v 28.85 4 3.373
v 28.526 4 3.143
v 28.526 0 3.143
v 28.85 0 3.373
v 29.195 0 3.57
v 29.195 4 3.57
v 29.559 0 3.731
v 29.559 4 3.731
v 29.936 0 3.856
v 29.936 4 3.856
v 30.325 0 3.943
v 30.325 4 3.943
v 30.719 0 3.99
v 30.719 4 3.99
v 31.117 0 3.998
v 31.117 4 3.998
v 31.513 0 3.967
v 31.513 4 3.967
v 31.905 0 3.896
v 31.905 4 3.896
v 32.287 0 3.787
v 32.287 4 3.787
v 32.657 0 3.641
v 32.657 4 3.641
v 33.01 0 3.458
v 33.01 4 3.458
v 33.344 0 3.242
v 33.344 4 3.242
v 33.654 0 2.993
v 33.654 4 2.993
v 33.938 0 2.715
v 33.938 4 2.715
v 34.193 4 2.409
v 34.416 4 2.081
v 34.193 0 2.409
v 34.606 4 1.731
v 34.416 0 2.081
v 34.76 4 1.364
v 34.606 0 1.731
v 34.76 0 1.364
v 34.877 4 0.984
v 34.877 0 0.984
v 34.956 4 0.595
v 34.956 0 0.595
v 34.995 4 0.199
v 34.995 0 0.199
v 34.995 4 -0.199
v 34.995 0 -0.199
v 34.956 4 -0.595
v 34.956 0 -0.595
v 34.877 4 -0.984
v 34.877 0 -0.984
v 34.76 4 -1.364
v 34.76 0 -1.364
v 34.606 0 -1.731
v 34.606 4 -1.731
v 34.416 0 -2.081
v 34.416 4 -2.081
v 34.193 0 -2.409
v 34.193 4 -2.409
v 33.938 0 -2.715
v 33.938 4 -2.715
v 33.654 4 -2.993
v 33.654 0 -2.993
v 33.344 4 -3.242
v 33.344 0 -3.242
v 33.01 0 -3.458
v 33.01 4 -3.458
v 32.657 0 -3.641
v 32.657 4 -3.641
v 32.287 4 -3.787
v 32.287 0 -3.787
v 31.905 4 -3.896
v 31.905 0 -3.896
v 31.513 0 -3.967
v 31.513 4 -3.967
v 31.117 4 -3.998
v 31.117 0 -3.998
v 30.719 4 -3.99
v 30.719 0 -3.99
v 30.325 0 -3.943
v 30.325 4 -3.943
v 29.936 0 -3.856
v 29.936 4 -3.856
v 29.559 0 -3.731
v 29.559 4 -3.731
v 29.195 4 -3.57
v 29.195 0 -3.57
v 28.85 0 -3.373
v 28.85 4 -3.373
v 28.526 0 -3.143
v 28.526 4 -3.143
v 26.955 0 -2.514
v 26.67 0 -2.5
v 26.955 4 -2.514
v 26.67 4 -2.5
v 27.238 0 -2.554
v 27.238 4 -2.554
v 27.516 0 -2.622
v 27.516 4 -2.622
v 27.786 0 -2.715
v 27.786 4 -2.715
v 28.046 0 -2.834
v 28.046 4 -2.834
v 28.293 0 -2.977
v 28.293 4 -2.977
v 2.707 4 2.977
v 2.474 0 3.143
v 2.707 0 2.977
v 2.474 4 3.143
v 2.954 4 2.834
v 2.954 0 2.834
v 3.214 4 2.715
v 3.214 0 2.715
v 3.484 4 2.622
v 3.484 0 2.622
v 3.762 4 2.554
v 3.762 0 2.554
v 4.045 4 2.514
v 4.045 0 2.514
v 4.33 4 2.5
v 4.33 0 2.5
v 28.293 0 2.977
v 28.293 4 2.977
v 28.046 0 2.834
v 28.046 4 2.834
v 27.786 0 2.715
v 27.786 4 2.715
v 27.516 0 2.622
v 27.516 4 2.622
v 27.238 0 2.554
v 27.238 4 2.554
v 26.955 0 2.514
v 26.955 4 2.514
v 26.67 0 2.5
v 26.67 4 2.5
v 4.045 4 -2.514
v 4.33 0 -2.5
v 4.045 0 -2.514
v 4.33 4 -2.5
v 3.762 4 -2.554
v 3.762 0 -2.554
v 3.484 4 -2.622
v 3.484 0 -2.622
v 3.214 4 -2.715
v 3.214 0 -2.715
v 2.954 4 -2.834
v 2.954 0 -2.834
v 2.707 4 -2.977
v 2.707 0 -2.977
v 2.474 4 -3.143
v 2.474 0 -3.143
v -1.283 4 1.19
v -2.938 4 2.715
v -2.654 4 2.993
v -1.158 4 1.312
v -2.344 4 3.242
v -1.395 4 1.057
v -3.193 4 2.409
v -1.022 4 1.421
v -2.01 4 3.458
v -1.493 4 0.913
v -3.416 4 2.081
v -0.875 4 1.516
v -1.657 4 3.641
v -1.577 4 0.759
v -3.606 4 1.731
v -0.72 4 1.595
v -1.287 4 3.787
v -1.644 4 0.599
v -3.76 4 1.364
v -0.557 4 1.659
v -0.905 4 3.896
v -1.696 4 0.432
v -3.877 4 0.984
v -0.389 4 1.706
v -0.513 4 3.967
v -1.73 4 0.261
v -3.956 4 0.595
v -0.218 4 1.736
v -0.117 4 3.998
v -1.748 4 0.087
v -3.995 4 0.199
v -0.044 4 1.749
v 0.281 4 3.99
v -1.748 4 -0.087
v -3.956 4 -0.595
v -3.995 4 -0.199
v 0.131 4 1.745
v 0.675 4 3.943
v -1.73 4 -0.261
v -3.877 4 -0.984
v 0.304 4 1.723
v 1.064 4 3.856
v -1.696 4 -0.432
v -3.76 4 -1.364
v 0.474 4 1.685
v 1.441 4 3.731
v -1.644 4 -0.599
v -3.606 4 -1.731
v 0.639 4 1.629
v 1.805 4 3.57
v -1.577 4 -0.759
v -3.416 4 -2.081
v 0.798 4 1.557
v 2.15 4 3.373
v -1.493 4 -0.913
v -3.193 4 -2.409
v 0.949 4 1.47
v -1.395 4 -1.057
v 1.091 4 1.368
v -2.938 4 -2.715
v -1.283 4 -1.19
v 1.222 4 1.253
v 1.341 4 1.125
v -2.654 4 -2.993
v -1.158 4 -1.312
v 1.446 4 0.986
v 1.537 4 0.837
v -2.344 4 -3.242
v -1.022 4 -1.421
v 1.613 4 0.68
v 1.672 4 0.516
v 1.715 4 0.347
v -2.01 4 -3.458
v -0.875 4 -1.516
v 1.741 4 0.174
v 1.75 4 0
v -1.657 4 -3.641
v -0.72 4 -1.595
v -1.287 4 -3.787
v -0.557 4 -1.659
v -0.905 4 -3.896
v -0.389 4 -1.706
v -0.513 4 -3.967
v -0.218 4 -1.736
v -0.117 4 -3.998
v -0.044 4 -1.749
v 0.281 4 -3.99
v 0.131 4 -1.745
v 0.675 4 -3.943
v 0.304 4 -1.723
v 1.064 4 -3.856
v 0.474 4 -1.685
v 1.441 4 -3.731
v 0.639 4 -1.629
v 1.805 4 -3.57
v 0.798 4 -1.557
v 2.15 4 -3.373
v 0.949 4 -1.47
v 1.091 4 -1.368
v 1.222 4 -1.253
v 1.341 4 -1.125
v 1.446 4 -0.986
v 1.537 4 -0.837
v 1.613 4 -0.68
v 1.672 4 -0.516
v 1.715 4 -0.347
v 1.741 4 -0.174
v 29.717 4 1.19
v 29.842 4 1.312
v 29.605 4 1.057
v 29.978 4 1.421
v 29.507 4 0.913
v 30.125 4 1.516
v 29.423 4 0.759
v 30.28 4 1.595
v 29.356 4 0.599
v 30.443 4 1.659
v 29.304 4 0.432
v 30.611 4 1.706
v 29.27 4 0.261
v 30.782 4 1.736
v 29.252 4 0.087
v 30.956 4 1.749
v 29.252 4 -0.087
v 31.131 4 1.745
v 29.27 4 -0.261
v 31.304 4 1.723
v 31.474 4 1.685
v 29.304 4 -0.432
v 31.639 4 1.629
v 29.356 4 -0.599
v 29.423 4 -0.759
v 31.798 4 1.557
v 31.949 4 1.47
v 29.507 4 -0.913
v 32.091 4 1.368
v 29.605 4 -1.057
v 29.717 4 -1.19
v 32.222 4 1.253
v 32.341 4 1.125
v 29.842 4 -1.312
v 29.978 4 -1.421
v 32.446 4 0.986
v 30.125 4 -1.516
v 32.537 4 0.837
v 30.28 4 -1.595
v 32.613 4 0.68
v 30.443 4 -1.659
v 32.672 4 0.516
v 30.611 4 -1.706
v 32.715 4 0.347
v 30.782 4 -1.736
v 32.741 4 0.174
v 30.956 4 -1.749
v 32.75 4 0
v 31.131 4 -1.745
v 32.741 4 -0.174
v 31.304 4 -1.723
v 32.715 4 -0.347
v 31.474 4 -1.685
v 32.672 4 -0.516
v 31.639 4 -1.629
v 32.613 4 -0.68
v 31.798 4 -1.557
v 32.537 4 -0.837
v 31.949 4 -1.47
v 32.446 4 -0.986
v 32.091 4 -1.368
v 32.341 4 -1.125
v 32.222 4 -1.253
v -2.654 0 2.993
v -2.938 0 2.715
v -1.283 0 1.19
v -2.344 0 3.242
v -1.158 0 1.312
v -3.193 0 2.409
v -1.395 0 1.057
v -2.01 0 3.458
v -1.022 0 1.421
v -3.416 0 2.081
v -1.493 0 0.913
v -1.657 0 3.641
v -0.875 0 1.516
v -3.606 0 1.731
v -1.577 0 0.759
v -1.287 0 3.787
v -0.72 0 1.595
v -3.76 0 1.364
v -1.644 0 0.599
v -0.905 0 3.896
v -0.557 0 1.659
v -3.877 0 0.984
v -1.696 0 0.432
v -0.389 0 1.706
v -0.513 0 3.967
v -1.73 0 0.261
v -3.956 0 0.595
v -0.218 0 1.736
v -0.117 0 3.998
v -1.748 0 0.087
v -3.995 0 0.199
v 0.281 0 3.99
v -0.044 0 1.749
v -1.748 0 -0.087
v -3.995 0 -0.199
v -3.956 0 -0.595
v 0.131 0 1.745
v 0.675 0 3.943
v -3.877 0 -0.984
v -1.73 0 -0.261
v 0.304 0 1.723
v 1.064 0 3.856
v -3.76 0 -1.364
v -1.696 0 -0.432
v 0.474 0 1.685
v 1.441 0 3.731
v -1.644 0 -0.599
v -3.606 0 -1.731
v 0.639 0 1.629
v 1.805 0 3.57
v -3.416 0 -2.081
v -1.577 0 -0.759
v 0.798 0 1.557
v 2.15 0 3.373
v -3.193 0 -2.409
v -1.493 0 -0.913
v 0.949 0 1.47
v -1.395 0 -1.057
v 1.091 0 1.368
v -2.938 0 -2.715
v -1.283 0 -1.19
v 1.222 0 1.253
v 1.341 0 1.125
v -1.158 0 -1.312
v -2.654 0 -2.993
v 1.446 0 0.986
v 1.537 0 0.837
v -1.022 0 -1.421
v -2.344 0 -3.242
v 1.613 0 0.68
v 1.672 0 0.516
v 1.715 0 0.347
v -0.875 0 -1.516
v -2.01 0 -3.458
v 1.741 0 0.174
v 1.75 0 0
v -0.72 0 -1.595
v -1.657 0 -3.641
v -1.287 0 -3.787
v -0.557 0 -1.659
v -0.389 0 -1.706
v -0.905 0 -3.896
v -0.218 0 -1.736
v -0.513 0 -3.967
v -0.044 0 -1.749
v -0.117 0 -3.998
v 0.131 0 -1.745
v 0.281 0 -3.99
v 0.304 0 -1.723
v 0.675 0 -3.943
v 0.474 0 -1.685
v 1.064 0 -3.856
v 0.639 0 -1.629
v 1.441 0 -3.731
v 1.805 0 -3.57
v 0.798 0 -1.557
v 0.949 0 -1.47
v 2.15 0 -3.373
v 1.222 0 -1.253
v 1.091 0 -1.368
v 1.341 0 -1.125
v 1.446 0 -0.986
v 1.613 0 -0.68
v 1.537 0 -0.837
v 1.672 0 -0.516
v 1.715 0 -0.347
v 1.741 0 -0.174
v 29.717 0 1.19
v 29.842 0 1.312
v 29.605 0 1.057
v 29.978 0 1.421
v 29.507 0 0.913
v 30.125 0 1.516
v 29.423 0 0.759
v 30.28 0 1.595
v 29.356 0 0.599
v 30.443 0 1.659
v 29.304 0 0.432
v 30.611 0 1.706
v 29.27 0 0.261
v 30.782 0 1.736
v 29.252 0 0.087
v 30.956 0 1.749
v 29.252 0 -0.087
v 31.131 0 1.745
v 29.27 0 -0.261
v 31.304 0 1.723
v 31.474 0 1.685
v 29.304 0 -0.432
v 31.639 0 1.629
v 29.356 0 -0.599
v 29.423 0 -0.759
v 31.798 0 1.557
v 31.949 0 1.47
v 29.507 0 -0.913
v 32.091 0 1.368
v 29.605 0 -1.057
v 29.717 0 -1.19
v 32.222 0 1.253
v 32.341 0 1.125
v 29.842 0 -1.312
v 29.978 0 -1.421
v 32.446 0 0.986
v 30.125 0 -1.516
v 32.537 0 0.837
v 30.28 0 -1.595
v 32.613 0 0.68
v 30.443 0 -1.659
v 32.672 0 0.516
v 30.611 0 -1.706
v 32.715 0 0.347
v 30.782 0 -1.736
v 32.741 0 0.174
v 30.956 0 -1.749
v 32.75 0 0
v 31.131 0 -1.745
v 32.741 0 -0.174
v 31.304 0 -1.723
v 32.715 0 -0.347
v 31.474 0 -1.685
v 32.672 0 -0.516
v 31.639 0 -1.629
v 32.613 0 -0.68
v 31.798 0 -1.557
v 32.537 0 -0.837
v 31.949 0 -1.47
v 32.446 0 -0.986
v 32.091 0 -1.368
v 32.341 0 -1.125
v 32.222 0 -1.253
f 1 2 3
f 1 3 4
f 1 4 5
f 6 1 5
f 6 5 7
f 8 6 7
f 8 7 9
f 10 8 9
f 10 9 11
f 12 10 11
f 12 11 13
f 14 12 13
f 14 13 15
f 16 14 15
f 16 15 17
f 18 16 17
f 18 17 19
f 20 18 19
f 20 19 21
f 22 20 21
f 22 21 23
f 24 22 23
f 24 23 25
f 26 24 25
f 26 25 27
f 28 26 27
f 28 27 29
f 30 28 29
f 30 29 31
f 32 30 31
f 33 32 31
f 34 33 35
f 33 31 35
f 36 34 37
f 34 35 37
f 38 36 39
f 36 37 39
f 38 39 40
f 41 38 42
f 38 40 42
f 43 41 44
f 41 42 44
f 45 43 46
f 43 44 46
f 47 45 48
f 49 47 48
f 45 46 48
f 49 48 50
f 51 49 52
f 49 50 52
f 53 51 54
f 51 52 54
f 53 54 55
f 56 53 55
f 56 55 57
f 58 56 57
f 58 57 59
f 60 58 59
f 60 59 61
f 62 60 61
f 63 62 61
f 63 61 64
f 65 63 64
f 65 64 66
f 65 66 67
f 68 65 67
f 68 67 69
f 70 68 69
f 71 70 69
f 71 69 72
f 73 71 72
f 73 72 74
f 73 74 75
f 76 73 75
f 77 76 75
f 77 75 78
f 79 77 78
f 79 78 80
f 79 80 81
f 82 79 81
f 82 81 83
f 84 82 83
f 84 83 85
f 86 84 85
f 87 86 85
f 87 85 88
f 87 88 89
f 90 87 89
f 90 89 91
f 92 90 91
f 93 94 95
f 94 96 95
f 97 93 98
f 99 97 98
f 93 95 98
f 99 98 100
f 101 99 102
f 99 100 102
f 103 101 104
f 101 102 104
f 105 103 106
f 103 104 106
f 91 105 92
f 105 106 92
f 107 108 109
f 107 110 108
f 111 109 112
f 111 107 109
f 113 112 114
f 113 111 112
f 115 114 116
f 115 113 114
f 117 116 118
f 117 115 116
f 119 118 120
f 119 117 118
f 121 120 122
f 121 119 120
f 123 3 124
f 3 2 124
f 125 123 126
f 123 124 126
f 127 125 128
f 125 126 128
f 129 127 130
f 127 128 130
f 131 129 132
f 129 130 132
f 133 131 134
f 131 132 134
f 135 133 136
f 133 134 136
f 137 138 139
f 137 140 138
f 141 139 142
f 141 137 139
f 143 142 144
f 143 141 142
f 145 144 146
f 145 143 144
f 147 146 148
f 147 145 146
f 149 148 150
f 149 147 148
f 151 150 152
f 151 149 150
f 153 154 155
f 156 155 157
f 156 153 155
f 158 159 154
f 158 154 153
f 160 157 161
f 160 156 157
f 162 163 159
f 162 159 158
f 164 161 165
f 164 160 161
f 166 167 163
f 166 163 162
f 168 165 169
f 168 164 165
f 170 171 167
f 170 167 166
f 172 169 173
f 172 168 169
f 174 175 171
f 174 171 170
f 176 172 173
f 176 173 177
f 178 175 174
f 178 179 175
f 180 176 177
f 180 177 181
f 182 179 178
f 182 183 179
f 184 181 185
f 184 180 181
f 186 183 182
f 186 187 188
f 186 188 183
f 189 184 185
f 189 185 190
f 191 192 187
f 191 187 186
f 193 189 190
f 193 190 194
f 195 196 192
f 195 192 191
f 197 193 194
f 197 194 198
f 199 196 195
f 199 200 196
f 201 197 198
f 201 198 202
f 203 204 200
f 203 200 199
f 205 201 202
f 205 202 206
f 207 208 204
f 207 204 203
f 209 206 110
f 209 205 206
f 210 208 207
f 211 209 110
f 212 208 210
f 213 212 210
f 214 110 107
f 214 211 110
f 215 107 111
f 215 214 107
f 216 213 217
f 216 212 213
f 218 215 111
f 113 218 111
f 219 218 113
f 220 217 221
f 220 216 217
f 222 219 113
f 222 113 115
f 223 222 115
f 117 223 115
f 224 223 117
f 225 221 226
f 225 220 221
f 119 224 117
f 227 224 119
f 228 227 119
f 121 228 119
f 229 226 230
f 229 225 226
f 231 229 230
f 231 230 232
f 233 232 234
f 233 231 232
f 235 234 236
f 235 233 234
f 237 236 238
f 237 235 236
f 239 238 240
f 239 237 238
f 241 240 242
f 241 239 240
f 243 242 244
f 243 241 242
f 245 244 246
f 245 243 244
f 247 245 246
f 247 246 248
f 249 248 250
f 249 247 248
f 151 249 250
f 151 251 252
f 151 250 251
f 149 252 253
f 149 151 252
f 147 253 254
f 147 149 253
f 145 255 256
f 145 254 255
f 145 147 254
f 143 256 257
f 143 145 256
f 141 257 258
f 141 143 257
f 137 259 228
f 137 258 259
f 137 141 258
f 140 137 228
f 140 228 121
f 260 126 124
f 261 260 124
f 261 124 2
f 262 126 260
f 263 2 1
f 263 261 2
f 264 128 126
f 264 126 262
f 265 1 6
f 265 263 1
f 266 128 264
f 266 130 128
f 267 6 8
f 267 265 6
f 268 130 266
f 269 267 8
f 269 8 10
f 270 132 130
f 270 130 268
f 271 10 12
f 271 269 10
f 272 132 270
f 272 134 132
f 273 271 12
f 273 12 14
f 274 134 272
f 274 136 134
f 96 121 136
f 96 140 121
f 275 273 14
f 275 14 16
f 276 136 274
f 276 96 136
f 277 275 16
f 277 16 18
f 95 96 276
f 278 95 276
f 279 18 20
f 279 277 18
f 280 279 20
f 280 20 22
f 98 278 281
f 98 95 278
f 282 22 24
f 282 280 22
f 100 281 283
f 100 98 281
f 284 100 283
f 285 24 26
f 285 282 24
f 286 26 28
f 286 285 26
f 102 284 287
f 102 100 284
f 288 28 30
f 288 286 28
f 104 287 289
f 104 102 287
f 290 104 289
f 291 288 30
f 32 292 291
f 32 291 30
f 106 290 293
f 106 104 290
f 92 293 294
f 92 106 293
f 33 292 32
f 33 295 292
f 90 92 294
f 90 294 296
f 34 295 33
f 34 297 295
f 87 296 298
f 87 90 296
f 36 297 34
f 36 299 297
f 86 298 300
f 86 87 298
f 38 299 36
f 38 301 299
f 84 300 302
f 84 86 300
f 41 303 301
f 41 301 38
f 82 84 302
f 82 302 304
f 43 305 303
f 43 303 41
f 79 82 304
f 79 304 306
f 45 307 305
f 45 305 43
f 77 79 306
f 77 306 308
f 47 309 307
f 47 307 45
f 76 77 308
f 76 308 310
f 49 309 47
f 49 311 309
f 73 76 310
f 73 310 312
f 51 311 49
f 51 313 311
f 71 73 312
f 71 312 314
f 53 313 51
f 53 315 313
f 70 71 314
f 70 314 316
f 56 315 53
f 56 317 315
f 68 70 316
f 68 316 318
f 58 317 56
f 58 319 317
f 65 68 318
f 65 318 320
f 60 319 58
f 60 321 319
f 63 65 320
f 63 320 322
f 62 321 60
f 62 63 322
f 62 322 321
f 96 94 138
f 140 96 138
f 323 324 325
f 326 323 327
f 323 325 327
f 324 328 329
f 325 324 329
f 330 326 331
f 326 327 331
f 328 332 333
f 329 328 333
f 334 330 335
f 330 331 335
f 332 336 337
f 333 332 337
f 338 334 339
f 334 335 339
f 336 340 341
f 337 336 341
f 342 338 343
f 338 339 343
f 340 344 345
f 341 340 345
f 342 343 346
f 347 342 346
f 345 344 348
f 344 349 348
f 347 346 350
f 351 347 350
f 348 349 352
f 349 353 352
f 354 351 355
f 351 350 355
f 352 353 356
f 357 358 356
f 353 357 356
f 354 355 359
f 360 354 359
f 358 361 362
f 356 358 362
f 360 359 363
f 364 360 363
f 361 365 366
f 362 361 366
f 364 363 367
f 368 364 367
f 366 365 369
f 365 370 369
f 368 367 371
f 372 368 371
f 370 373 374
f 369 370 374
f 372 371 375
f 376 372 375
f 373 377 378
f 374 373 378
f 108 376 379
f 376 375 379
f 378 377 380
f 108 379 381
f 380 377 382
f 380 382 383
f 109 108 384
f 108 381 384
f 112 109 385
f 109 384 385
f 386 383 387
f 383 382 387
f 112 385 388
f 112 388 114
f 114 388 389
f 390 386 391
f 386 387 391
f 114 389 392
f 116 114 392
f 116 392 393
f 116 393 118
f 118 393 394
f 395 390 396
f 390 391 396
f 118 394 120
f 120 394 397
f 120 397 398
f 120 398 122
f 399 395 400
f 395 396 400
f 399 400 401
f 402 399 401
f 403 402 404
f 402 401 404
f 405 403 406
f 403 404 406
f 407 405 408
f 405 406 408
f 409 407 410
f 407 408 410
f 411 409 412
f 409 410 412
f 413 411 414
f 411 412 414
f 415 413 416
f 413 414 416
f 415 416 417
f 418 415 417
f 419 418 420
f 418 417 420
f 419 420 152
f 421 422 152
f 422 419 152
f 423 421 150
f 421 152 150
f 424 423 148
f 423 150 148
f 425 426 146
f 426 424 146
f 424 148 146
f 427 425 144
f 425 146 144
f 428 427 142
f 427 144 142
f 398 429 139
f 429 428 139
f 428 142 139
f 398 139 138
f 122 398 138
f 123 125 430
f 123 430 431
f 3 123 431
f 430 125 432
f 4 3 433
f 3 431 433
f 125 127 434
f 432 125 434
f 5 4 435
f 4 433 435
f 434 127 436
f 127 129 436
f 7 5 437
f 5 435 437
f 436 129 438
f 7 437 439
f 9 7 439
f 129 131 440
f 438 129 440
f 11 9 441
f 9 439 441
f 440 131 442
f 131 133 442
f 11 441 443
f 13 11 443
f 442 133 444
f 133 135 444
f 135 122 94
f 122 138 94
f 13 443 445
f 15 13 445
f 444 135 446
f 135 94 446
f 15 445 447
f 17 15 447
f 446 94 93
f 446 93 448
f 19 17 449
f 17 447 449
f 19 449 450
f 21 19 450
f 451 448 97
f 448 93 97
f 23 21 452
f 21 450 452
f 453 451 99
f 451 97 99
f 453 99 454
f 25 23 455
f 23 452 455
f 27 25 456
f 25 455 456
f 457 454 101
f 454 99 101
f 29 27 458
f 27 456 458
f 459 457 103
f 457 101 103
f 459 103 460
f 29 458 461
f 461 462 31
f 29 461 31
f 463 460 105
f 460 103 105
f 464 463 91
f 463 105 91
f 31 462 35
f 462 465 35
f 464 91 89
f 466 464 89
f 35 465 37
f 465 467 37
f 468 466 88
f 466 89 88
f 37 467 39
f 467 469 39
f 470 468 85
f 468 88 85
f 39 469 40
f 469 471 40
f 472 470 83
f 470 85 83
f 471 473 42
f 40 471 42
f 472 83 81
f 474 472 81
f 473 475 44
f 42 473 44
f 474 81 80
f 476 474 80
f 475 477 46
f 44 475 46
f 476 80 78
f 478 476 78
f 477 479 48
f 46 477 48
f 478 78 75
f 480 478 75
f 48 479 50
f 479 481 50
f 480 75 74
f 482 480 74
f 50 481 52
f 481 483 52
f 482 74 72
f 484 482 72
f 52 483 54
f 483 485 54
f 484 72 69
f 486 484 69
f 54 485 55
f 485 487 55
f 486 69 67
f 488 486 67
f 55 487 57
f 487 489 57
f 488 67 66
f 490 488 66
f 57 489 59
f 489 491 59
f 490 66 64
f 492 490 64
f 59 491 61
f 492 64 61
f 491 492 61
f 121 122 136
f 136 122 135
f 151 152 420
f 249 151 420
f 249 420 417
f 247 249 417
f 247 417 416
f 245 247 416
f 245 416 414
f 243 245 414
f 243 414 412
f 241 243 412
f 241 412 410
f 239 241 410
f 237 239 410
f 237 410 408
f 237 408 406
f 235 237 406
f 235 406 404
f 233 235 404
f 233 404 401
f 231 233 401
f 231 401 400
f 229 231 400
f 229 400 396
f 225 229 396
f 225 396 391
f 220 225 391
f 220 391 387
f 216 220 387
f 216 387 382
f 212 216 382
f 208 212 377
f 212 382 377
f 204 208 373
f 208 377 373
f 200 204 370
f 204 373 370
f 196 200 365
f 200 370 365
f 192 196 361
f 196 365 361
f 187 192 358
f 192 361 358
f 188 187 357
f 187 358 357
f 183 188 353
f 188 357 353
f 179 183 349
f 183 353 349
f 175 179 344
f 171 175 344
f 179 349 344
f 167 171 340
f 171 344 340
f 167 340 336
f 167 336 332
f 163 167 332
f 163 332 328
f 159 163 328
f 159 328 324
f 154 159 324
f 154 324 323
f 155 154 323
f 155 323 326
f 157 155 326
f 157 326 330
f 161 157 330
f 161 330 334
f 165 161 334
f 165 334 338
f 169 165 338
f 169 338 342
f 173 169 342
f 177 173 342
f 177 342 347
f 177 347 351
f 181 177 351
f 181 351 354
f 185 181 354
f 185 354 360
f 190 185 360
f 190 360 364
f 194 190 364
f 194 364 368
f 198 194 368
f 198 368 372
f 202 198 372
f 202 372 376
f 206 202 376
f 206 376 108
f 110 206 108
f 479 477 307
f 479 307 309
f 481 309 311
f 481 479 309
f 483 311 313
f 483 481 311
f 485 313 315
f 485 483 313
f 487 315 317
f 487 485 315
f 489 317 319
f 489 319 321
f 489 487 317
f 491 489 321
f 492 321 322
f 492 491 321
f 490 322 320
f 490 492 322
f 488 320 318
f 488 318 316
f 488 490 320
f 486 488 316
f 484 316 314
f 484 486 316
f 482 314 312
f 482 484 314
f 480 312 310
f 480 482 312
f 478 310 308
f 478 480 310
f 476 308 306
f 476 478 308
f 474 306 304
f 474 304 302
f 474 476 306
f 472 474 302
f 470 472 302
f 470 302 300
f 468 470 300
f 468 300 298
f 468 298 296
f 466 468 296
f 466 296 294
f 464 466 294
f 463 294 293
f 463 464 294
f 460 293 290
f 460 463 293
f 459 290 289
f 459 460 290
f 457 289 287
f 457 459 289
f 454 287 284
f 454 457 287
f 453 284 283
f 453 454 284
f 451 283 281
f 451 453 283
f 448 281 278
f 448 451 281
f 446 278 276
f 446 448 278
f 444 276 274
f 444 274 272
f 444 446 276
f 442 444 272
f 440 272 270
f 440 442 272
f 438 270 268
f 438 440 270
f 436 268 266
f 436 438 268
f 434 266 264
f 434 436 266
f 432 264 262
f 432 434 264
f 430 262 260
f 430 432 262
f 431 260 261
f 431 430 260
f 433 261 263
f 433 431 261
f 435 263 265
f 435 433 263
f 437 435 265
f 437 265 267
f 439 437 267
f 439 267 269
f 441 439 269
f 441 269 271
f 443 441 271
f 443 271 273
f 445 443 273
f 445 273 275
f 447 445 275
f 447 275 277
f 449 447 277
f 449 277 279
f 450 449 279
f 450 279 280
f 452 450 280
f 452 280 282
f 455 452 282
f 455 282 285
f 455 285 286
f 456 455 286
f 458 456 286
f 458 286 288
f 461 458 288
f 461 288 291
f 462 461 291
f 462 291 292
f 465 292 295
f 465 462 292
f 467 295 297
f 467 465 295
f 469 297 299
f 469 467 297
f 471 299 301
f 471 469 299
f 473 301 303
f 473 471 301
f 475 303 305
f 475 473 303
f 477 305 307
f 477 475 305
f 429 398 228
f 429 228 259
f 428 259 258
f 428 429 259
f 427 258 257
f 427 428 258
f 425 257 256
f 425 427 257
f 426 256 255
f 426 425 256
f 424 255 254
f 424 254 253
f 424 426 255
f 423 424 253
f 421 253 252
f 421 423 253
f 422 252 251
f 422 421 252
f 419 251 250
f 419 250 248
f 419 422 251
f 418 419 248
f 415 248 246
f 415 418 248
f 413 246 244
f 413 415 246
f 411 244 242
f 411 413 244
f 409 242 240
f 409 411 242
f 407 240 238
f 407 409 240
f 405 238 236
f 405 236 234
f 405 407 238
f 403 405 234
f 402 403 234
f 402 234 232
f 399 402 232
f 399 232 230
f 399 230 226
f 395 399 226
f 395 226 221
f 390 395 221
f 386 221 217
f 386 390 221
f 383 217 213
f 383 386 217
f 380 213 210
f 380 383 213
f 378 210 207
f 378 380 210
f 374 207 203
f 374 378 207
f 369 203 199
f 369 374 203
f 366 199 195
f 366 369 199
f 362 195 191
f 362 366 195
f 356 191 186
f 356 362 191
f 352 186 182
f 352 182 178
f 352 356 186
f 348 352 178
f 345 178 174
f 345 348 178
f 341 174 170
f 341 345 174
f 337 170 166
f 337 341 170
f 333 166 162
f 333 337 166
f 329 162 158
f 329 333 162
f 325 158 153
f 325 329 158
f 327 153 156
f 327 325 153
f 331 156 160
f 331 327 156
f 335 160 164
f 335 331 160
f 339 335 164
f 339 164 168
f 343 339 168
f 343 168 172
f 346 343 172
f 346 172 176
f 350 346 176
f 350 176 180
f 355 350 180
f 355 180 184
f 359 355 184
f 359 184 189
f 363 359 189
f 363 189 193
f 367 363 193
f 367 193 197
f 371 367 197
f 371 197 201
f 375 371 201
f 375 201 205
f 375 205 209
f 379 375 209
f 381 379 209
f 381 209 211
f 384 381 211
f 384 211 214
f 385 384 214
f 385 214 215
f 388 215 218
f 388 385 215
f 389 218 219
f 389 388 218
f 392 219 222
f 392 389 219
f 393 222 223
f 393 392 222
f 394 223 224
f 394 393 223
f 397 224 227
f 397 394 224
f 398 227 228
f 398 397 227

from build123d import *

# Parameters (mm, degrees)
SKETCH1_R           = 1.75
BOSS_EXTRUDE1_DEPTH = 4
FILLET1_R           = 3


with BuildPart() as part:
    # Sketch1 → Boss-Extrude1 (new body)
    with BuildSketch(Plane(origin=(0, 0, 0), x_dir=(1, 0, 0), z_dir=(0, 1, 0))):
        with BuildLine():
            Line((27.877501001, 2.5), (3.122498999, 2.5))
            ThreePointArc((3.122498999, 2.5), (-4, 0), (3.122498999, -2.5))
            Line((3.122498999, -2.5), (27.877501001, -2.5))
            ThreePointArc((27.877501001, -2.5), (35, 0), (27.877501001, 2.5))
        make_face()
        Circle(SKETCH1_R, mode=Mode.SUBTRACT)
        with Locations((31, 0)):
            Circle(SKETCH1_R, mode=Mode.SUBTRACT)
    extrude(amount=BOSS_EXTRUDE1_DEPTH)

    # Fillet1
    fillet1_edges = [part.edges().sort_by_distance(p)[0] for p in [
        (27.877501001, 2, 2.5),
        (3.122498999, 2, 2.5),
        (3.122498999, 2, -2.5),
        (27.877501001, 2, -2.5),
    ]]
    fillet(fillet1_edges, radius=FILLET1_R)


solid = part.part
